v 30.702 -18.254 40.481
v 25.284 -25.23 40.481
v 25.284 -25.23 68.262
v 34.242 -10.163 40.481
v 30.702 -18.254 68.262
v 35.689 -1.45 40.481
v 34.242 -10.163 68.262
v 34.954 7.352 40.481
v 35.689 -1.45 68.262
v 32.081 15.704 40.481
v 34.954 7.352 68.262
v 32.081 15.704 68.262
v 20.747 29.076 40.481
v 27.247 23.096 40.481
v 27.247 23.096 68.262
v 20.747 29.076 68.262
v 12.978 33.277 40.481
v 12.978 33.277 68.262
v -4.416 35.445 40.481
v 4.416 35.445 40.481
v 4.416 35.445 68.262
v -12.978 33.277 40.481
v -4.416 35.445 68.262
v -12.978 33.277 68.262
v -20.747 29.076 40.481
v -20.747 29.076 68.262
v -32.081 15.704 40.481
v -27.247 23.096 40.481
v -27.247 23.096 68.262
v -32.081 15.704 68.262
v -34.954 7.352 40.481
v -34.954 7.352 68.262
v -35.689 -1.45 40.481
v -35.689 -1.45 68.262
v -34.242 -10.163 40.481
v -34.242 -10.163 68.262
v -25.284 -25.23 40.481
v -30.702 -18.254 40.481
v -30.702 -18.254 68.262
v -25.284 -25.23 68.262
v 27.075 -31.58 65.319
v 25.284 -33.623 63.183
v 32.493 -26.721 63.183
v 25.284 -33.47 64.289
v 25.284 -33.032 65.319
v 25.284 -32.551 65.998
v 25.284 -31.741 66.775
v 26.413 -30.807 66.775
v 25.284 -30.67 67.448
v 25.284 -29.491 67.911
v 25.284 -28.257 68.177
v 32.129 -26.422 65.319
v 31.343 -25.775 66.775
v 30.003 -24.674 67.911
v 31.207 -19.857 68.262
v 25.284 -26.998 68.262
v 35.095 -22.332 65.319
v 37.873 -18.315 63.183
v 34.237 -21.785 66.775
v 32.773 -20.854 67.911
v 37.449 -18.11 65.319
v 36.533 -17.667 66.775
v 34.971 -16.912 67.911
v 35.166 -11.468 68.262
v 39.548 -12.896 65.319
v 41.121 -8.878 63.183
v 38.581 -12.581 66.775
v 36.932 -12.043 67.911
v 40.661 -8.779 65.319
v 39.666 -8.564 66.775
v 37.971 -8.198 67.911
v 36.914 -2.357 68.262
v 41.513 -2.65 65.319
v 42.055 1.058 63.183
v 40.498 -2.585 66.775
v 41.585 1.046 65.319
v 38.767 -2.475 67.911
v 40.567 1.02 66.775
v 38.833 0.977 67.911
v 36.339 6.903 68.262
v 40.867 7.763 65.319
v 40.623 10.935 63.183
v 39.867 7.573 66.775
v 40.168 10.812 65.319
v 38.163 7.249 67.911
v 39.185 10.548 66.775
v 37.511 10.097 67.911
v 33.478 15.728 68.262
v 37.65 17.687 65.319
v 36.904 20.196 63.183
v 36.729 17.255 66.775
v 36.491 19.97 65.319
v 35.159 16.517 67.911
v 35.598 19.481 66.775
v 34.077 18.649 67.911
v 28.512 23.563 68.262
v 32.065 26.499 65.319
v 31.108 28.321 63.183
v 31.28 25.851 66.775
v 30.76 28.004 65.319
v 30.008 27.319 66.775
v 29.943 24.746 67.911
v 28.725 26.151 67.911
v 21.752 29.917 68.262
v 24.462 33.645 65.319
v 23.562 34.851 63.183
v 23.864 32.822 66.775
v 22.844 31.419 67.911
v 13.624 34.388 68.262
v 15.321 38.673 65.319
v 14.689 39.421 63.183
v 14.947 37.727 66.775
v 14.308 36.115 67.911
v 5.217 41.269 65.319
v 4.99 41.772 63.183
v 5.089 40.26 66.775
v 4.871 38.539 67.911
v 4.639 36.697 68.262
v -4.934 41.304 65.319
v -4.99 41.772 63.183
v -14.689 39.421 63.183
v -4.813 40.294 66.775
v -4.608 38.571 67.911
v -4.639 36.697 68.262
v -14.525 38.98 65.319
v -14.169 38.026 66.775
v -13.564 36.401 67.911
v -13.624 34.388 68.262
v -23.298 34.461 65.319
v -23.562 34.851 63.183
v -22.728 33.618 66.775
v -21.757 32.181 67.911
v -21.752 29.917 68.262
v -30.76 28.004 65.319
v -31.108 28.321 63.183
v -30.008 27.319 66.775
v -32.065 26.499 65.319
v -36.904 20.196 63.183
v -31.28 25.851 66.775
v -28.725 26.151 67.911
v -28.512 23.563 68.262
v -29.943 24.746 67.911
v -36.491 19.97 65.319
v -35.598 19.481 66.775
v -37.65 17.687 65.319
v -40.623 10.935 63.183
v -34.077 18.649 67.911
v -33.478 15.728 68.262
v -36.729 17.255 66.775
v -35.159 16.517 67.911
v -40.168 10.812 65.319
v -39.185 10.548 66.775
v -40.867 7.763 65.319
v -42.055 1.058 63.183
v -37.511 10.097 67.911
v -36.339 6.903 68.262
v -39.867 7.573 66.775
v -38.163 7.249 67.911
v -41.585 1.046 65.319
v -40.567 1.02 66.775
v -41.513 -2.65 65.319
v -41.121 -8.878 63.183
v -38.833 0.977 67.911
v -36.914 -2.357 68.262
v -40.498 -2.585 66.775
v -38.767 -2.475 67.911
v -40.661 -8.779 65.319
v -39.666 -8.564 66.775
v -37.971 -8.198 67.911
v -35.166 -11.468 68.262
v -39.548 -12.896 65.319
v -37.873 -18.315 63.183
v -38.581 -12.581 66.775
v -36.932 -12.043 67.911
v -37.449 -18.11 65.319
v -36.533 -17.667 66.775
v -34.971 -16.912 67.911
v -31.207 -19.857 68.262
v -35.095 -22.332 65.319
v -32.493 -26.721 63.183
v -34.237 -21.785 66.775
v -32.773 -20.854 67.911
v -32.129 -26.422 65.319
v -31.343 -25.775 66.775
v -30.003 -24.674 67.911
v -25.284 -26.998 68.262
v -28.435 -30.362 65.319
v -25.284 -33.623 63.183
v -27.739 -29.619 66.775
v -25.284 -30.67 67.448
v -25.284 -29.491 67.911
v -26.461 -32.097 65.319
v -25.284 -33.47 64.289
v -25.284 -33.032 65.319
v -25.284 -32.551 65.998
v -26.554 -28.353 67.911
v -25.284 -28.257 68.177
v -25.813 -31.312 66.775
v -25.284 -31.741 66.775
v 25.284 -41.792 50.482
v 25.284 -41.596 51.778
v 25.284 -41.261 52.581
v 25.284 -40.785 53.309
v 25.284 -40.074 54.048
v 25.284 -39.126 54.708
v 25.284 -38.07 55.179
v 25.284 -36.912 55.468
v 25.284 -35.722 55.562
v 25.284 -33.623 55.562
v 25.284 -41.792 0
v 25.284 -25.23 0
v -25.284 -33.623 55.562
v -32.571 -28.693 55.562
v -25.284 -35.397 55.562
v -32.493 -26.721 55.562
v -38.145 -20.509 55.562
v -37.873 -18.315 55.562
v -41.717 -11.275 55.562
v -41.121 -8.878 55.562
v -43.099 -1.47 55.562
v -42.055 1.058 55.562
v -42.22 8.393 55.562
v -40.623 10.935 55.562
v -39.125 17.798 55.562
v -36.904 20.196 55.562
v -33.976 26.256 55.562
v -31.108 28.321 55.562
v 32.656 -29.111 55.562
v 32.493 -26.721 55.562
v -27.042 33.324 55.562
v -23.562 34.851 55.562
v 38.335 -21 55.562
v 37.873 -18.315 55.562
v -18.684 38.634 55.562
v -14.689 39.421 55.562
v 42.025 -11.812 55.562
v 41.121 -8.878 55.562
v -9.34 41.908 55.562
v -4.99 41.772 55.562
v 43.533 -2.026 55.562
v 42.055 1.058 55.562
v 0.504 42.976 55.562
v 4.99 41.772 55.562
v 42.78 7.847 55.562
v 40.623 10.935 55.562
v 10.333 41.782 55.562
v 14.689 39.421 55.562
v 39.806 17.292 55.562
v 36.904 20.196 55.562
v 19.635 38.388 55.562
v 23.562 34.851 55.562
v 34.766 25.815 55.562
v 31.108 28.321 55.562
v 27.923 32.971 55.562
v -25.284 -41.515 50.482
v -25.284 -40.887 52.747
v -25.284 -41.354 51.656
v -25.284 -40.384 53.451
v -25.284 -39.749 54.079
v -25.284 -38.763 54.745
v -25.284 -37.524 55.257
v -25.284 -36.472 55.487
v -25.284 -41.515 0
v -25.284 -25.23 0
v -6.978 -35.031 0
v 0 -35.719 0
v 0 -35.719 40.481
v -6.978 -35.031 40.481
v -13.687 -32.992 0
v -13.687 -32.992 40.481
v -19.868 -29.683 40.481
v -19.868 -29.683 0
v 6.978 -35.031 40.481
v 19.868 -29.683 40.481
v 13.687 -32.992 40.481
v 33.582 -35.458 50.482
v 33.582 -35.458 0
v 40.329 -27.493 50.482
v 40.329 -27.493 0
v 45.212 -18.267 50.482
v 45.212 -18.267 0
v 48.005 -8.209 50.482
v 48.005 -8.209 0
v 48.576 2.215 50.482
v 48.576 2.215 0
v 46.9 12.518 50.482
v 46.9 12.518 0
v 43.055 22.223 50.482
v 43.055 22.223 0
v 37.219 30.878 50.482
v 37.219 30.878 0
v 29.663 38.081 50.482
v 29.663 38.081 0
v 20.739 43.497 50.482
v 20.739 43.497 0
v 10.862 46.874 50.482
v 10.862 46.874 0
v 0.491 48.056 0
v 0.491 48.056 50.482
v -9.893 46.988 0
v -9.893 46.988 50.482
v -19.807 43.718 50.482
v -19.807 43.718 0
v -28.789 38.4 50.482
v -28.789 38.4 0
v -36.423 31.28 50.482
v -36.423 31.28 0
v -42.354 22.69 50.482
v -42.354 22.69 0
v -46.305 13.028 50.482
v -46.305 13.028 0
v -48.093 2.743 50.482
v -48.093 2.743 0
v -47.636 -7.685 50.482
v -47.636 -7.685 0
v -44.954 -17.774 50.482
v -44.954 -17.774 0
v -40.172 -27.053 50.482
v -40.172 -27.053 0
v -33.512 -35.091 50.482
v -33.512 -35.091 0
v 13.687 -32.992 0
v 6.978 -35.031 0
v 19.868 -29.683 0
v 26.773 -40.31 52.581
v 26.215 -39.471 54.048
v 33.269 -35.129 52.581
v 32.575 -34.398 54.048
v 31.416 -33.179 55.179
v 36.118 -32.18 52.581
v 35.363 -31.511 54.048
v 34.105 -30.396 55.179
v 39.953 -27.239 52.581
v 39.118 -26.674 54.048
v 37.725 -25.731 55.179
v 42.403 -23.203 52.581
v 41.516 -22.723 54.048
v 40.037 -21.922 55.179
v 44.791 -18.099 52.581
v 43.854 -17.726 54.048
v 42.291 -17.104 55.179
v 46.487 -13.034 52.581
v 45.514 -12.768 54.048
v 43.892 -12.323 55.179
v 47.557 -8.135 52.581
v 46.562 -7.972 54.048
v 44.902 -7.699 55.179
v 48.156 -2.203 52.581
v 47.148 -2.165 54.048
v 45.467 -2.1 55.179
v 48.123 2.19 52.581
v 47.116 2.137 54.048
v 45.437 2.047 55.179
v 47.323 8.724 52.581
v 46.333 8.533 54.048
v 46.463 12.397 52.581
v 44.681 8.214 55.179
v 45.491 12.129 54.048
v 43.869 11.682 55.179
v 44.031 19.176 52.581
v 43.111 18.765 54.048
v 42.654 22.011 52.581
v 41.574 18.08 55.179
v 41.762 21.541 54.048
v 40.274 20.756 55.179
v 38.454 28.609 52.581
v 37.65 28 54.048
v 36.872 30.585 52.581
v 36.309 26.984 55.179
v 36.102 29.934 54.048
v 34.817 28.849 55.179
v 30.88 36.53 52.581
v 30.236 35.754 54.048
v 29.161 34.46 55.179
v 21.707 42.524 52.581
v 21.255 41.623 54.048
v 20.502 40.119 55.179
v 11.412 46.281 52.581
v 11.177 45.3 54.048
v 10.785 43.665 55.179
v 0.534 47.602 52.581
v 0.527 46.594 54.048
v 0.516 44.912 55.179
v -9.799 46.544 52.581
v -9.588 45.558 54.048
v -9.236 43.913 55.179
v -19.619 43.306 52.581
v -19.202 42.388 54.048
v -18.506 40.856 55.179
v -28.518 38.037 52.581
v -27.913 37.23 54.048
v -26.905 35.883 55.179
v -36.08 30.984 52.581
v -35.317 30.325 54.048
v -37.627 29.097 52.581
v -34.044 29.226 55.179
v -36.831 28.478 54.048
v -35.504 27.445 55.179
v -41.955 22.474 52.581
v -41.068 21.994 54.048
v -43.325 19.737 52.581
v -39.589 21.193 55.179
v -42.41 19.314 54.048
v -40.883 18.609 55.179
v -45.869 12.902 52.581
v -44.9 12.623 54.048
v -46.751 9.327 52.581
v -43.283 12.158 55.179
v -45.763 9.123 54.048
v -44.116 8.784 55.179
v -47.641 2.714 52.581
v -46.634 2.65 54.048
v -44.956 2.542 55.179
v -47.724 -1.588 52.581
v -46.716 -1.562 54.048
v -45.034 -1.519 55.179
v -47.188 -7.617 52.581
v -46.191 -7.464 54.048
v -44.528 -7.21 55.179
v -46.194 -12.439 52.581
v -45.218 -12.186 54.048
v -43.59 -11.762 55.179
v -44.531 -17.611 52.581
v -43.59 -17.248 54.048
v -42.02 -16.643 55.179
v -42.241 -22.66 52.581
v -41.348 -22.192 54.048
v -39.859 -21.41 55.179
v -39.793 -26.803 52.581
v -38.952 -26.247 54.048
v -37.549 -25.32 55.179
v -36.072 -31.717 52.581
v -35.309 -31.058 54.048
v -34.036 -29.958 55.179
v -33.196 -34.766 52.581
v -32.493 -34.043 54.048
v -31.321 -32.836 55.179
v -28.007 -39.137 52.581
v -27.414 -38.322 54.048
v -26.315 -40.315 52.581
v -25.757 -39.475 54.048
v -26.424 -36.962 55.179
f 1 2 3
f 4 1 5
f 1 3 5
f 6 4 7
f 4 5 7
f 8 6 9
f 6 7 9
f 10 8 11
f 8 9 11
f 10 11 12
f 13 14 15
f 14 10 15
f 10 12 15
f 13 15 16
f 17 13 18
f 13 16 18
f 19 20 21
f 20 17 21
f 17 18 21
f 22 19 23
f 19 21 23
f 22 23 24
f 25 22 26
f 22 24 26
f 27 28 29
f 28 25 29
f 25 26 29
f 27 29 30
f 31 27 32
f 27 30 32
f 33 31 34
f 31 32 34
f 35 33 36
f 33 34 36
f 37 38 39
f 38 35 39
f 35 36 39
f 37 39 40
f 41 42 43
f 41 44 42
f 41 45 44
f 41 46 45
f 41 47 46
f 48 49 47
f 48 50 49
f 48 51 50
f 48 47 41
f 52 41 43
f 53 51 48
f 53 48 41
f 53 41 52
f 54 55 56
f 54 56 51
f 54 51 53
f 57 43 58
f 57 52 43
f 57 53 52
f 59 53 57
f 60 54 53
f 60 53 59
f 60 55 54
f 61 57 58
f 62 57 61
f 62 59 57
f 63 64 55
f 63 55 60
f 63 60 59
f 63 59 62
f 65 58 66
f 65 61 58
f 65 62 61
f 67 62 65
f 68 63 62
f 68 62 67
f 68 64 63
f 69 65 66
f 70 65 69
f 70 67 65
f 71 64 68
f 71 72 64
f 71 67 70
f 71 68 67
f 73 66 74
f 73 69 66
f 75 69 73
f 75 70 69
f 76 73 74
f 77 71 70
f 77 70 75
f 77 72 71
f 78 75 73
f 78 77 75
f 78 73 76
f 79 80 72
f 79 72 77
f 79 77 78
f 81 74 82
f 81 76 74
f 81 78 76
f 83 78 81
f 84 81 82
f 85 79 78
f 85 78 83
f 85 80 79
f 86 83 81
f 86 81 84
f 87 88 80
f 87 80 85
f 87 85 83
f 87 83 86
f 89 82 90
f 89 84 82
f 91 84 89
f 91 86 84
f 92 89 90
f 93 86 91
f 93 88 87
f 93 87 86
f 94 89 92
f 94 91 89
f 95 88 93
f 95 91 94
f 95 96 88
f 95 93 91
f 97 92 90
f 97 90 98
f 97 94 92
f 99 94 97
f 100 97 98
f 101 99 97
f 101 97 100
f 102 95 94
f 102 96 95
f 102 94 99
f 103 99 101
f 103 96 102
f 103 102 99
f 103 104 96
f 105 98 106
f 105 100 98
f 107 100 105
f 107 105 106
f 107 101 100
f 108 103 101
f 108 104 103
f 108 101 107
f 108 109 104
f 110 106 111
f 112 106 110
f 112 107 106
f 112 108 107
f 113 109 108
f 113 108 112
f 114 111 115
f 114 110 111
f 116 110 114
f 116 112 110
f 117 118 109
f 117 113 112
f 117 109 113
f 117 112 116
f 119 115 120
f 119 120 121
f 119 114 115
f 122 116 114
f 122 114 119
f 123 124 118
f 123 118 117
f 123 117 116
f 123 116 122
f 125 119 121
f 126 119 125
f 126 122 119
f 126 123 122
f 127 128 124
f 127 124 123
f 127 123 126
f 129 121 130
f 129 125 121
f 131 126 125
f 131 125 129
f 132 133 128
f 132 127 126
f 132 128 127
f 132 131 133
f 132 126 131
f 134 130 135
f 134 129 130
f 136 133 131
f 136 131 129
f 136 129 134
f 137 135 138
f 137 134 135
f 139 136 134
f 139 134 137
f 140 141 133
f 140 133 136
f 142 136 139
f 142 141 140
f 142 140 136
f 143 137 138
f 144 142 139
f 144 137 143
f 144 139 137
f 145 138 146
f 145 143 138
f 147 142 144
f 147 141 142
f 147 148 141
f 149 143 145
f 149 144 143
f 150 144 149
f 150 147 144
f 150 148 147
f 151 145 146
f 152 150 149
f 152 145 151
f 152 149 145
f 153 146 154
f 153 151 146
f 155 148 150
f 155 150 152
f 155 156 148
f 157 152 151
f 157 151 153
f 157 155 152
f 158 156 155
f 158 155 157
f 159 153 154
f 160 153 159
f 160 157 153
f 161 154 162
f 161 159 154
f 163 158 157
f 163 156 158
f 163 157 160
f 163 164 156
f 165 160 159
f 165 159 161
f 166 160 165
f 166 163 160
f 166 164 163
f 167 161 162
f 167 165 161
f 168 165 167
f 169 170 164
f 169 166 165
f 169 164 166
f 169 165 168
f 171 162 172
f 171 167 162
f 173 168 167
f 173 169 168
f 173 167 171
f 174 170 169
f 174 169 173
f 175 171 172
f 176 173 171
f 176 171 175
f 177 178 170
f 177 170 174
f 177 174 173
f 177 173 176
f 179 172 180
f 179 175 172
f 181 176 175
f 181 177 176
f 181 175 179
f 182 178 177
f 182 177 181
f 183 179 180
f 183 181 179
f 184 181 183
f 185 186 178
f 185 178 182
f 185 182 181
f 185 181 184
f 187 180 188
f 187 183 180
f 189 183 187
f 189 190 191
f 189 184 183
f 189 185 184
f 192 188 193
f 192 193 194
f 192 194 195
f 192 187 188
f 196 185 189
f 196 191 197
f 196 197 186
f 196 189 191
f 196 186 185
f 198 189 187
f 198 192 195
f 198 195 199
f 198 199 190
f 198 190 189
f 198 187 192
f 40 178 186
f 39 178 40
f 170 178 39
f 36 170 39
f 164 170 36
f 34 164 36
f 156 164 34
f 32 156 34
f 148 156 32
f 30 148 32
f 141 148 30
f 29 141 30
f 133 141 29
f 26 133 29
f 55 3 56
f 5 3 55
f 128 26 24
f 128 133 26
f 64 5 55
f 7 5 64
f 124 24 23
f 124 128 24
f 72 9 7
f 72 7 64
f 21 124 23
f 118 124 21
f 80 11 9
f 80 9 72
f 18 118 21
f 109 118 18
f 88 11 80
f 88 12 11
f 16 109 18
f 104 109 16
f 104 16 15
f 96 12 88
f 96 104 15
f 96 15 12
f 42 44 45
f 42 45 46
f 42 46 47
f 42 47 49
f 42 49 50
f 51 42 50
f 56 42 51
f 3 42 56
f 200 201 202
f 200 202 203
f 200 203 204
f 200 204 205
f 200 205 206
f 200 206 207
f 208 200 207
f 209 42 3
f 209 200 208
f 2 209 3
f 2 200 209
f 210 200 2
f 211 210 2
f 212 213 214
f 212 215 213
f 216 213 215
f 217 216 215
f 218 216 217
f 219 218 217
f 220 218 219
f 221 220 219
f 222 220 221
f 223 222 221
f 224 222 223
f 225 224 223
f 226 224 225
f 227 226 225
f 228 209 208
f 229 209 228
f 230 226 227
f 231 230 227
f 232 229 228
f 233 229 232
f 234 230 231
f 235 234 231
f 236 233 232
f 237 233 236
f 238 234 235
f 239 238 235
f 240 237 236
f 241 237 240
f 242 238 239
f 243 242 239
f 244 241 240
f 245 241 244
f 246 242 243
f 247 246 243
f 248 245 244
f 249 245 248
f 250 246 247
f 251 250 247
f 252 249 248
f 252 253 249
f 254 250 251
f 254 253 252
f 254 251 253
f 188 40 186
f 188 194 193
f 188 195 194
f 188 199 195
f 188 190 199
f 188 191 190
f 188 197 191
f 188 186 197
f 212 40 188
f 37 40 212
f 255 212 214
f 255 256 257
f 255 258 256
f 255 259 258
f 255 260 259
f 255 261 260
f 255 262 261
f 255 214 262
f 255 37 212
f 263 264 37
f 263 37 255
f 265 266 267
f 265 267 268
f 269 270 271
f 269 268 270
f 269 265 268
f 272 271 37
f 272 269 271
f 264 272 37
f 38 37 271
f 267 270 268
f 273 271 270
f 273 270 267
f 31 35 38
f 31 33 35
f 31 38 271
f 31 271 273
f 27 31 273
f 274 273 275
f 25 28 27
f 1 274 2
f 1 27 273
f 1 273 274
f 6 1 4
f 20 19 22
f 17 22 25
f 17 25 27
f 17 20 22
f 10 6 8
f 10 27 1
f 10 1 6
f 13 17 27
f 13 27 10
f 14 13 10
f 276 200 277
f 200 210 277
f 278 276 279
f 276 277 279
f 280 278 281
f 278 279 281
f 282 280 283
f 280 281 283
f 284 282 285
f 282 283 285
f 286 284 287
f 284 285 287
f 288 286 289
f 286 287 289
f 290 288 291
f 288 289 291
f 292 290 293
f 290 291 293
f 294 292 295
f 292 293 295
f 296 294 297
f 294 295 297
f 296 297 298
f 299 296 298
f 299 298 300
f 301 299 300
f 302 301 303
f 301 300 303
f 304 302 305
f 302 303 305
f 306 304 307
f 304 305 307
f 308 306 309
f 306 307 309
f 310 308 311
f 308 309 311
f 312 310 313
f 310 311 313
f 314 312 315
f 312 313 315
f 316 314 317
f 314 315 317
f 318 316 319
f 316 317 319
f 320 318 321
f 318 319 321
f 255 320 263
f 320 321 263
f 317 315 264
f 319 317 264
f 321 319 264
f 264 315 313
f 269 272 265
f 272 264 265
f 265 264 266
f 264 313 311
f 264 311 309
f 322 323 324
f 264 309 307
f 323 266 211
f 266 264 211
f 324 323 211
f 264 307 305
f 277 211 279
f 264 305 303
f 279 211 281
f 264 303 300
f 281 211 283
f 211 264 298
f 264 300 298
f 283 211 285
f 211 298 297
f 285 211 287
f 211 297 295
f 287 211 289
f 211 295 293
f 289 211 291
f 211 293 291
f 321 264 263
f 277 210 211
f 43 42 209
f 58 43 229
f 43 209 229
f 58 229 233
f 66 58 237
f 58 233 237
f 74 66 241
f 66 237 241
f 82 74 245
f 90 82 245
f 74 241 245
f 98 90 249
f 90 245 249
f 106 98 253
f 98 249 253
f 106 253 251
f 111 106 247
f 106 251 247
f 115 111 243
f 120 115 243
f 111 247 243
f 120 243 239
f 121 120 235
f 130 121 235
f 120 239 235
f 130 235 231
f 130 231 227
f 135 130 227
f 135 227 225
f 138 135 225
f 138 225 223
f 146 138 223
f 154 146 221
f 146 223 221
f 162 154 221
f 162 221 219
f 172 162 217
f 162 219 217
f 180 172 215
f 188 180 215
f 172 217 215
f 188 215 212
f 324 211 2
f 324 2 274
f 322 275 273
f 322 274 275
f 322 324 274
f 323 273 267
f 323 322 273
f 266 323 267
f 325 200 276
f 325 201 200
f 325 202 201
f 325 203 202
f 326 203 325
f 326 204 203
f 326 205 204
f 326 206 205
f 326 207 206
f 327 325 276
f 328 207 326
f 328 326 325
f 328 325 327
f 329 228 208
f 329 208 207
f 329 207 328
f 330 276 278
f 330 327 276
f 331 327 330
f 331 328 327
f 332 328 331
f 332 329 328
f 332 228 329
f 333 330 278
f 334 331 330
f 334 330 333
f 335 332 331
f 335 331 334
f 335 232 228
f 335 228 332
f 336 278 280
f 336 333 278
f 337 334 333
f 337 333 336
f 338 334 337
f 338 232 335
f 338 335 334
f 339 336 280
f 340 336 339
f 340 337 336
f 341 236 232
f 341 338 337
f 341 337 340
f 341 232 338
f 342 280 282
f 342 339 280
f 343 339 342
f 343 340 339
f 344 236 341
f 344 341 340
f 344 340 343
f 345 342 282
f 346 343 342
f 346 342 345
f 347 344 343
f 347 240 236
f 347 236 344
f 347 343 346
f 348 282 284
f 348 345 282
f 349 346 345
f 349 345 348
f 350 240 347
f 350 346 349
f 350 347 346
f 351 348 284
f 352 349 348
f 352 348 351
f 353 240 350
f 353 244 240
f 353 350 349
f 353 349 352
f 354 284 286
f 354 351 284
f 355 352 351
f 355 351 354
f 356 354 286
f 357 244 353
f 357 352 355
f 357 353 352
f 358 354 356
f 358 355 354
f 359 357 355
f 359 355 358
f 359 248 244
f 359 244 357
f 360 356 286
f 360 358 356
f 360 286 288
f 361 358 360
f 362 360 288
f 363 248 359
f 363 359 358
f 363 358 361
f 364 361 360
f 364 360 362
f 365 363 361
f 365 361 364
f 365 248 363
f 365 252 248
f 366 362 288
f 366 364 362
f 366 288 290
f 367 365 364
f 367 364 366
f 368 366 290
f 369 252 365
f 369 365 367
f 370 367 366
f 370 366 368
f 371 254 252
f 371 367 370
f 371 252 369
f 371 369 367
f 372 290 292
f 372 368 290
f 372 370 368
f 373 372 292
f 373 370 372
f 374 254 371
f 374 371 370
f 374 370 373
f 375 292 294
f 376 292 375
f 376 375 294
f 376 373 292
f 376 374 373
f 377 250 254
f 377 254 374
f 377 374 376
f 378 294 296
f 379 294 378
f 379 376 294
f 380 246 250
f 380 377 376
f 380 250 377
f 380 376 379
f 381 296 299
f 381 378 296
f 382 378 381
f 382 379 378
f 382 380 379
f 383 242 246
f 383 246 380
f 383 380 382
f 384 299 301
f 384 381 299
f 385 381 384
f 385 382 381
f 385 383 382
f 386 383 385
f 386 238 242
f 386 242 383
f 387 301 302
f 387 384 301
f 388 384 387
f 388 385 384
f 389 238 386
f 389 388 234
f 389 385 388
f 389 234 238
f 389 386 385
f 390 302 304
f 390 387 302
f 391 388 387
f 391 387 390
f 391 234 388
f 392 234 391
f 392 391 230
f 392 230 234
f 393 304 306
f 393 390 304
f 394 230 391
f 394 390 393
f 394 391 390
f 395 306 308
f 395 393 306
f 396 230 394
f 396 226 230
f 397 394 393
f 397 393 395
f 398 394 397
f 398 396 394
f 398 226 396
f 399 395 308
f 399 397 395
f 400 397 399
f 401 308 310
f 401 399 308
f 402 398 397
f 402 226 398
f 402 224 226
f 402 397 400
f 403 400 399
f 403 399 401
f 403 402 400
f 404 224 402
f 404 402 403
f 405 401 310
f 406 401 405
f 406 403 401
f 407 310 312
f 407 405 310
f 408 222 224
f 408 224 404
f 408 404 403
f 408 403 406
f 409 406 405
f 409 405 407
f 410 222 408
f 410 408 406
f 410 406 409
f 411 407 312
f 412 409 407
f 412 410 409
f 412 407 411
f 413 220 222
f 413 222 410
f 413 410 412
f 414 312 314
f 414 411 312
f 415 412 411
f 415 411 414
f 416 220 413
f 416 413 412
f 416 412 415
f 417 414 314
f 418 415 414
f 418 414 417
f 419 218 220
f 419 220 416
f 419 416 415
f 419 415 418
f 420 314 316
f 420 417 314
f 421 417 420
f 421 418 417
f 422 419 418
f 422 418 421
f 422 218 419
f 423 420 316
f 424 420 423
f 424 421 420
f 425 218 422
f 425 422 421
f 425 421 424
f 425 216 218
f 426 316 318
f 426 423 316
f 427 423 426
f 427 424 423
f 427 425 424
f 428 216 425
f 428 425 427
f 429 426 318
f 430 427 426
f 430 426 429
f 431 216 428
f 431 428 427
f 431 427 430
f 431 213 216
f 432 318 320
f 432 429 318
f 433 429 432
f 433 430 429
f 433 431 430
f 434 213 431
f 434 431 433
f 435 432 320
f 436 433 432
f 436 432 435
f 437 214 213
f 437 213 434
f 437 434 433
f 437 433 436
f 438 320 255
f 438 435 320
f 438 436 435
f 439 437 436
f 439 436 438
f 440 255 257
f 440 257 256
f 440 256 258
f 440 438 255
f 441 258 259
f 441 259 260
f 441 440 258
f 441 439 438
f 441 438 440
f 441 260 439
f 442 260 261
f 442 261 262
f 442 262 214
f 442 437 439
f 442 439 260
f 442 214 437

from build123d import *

# Parameters (mm, degrees)
F0_R     = 48.41875
F1_DEPTH = 55.5625
F2_R     = 42.06875
F3_DEPTH = 12.7
F4_R     = 35.71875
F5_DEPTH = 27.78125
F6_R     = 5.08
F8_DEPTH = 100.076


with BuildPart() as f1:
    # F0 (on Top) → F1 (new body)
    with BuildSketch(Plane.XY):
        with Locations((0.225817, -0.361804)):
            Circle(F0_R)
    extrude(amount=F1_DEPTH)

    # F2 (on face) → F3 (join)
    with BuildSketch(Plane.XY.offset(55.5625)):
        Circle(F2_R)
    extrude(amount=F3_DEPTH)

    # F4 (on face) → F5 (cut)
    with BuildSketch(Plane.XY.offset(68.2625)):
        Circle(F4_R)
    extrude(amount=-F5_DEPTH, mode=Mode.SUBTRACT)

    # F6
    f6_edges = [f1.edges().sort_by_distance(p)[0] for p in [
        (-48.192933, -0.361804, 55.5625),
        (-42.06875, 0, 68.2625),
    ]]
    fillet(f6_edges, radius=F6_R)

    # F7 (on Top) → F8 (cut)
    with BuildSketch(Plane.XY):
        with BuildLine():
            Line((25.284194, -55.836208), (25.284194, -25.229717))
            ThreePointArc((25.284194, -25.229717), (13.686766, -32.992447), (0, -35.71875))
            Line((0, -35.71875), (0, -55.836208))
            Line((0, -55.836208), (25.284194, -55.836208))
        make_face()
        with BuildLine():
            ThreePointArc((0, -35.71875), (-13.686766, -32.992447), (-25.284194, -25.229717))
            Line((-25.284194, -25.229717), (-25.284194, -55.836208))
            Line((-25.284194, -55.836208), (0, -55.836208))
            Line((0, -55.836208), (0, -35.71875))
        make_face()
    extrude(amount=F8_DEPTH, mode=Mode.SUBTRACT)


solid = f1.part
